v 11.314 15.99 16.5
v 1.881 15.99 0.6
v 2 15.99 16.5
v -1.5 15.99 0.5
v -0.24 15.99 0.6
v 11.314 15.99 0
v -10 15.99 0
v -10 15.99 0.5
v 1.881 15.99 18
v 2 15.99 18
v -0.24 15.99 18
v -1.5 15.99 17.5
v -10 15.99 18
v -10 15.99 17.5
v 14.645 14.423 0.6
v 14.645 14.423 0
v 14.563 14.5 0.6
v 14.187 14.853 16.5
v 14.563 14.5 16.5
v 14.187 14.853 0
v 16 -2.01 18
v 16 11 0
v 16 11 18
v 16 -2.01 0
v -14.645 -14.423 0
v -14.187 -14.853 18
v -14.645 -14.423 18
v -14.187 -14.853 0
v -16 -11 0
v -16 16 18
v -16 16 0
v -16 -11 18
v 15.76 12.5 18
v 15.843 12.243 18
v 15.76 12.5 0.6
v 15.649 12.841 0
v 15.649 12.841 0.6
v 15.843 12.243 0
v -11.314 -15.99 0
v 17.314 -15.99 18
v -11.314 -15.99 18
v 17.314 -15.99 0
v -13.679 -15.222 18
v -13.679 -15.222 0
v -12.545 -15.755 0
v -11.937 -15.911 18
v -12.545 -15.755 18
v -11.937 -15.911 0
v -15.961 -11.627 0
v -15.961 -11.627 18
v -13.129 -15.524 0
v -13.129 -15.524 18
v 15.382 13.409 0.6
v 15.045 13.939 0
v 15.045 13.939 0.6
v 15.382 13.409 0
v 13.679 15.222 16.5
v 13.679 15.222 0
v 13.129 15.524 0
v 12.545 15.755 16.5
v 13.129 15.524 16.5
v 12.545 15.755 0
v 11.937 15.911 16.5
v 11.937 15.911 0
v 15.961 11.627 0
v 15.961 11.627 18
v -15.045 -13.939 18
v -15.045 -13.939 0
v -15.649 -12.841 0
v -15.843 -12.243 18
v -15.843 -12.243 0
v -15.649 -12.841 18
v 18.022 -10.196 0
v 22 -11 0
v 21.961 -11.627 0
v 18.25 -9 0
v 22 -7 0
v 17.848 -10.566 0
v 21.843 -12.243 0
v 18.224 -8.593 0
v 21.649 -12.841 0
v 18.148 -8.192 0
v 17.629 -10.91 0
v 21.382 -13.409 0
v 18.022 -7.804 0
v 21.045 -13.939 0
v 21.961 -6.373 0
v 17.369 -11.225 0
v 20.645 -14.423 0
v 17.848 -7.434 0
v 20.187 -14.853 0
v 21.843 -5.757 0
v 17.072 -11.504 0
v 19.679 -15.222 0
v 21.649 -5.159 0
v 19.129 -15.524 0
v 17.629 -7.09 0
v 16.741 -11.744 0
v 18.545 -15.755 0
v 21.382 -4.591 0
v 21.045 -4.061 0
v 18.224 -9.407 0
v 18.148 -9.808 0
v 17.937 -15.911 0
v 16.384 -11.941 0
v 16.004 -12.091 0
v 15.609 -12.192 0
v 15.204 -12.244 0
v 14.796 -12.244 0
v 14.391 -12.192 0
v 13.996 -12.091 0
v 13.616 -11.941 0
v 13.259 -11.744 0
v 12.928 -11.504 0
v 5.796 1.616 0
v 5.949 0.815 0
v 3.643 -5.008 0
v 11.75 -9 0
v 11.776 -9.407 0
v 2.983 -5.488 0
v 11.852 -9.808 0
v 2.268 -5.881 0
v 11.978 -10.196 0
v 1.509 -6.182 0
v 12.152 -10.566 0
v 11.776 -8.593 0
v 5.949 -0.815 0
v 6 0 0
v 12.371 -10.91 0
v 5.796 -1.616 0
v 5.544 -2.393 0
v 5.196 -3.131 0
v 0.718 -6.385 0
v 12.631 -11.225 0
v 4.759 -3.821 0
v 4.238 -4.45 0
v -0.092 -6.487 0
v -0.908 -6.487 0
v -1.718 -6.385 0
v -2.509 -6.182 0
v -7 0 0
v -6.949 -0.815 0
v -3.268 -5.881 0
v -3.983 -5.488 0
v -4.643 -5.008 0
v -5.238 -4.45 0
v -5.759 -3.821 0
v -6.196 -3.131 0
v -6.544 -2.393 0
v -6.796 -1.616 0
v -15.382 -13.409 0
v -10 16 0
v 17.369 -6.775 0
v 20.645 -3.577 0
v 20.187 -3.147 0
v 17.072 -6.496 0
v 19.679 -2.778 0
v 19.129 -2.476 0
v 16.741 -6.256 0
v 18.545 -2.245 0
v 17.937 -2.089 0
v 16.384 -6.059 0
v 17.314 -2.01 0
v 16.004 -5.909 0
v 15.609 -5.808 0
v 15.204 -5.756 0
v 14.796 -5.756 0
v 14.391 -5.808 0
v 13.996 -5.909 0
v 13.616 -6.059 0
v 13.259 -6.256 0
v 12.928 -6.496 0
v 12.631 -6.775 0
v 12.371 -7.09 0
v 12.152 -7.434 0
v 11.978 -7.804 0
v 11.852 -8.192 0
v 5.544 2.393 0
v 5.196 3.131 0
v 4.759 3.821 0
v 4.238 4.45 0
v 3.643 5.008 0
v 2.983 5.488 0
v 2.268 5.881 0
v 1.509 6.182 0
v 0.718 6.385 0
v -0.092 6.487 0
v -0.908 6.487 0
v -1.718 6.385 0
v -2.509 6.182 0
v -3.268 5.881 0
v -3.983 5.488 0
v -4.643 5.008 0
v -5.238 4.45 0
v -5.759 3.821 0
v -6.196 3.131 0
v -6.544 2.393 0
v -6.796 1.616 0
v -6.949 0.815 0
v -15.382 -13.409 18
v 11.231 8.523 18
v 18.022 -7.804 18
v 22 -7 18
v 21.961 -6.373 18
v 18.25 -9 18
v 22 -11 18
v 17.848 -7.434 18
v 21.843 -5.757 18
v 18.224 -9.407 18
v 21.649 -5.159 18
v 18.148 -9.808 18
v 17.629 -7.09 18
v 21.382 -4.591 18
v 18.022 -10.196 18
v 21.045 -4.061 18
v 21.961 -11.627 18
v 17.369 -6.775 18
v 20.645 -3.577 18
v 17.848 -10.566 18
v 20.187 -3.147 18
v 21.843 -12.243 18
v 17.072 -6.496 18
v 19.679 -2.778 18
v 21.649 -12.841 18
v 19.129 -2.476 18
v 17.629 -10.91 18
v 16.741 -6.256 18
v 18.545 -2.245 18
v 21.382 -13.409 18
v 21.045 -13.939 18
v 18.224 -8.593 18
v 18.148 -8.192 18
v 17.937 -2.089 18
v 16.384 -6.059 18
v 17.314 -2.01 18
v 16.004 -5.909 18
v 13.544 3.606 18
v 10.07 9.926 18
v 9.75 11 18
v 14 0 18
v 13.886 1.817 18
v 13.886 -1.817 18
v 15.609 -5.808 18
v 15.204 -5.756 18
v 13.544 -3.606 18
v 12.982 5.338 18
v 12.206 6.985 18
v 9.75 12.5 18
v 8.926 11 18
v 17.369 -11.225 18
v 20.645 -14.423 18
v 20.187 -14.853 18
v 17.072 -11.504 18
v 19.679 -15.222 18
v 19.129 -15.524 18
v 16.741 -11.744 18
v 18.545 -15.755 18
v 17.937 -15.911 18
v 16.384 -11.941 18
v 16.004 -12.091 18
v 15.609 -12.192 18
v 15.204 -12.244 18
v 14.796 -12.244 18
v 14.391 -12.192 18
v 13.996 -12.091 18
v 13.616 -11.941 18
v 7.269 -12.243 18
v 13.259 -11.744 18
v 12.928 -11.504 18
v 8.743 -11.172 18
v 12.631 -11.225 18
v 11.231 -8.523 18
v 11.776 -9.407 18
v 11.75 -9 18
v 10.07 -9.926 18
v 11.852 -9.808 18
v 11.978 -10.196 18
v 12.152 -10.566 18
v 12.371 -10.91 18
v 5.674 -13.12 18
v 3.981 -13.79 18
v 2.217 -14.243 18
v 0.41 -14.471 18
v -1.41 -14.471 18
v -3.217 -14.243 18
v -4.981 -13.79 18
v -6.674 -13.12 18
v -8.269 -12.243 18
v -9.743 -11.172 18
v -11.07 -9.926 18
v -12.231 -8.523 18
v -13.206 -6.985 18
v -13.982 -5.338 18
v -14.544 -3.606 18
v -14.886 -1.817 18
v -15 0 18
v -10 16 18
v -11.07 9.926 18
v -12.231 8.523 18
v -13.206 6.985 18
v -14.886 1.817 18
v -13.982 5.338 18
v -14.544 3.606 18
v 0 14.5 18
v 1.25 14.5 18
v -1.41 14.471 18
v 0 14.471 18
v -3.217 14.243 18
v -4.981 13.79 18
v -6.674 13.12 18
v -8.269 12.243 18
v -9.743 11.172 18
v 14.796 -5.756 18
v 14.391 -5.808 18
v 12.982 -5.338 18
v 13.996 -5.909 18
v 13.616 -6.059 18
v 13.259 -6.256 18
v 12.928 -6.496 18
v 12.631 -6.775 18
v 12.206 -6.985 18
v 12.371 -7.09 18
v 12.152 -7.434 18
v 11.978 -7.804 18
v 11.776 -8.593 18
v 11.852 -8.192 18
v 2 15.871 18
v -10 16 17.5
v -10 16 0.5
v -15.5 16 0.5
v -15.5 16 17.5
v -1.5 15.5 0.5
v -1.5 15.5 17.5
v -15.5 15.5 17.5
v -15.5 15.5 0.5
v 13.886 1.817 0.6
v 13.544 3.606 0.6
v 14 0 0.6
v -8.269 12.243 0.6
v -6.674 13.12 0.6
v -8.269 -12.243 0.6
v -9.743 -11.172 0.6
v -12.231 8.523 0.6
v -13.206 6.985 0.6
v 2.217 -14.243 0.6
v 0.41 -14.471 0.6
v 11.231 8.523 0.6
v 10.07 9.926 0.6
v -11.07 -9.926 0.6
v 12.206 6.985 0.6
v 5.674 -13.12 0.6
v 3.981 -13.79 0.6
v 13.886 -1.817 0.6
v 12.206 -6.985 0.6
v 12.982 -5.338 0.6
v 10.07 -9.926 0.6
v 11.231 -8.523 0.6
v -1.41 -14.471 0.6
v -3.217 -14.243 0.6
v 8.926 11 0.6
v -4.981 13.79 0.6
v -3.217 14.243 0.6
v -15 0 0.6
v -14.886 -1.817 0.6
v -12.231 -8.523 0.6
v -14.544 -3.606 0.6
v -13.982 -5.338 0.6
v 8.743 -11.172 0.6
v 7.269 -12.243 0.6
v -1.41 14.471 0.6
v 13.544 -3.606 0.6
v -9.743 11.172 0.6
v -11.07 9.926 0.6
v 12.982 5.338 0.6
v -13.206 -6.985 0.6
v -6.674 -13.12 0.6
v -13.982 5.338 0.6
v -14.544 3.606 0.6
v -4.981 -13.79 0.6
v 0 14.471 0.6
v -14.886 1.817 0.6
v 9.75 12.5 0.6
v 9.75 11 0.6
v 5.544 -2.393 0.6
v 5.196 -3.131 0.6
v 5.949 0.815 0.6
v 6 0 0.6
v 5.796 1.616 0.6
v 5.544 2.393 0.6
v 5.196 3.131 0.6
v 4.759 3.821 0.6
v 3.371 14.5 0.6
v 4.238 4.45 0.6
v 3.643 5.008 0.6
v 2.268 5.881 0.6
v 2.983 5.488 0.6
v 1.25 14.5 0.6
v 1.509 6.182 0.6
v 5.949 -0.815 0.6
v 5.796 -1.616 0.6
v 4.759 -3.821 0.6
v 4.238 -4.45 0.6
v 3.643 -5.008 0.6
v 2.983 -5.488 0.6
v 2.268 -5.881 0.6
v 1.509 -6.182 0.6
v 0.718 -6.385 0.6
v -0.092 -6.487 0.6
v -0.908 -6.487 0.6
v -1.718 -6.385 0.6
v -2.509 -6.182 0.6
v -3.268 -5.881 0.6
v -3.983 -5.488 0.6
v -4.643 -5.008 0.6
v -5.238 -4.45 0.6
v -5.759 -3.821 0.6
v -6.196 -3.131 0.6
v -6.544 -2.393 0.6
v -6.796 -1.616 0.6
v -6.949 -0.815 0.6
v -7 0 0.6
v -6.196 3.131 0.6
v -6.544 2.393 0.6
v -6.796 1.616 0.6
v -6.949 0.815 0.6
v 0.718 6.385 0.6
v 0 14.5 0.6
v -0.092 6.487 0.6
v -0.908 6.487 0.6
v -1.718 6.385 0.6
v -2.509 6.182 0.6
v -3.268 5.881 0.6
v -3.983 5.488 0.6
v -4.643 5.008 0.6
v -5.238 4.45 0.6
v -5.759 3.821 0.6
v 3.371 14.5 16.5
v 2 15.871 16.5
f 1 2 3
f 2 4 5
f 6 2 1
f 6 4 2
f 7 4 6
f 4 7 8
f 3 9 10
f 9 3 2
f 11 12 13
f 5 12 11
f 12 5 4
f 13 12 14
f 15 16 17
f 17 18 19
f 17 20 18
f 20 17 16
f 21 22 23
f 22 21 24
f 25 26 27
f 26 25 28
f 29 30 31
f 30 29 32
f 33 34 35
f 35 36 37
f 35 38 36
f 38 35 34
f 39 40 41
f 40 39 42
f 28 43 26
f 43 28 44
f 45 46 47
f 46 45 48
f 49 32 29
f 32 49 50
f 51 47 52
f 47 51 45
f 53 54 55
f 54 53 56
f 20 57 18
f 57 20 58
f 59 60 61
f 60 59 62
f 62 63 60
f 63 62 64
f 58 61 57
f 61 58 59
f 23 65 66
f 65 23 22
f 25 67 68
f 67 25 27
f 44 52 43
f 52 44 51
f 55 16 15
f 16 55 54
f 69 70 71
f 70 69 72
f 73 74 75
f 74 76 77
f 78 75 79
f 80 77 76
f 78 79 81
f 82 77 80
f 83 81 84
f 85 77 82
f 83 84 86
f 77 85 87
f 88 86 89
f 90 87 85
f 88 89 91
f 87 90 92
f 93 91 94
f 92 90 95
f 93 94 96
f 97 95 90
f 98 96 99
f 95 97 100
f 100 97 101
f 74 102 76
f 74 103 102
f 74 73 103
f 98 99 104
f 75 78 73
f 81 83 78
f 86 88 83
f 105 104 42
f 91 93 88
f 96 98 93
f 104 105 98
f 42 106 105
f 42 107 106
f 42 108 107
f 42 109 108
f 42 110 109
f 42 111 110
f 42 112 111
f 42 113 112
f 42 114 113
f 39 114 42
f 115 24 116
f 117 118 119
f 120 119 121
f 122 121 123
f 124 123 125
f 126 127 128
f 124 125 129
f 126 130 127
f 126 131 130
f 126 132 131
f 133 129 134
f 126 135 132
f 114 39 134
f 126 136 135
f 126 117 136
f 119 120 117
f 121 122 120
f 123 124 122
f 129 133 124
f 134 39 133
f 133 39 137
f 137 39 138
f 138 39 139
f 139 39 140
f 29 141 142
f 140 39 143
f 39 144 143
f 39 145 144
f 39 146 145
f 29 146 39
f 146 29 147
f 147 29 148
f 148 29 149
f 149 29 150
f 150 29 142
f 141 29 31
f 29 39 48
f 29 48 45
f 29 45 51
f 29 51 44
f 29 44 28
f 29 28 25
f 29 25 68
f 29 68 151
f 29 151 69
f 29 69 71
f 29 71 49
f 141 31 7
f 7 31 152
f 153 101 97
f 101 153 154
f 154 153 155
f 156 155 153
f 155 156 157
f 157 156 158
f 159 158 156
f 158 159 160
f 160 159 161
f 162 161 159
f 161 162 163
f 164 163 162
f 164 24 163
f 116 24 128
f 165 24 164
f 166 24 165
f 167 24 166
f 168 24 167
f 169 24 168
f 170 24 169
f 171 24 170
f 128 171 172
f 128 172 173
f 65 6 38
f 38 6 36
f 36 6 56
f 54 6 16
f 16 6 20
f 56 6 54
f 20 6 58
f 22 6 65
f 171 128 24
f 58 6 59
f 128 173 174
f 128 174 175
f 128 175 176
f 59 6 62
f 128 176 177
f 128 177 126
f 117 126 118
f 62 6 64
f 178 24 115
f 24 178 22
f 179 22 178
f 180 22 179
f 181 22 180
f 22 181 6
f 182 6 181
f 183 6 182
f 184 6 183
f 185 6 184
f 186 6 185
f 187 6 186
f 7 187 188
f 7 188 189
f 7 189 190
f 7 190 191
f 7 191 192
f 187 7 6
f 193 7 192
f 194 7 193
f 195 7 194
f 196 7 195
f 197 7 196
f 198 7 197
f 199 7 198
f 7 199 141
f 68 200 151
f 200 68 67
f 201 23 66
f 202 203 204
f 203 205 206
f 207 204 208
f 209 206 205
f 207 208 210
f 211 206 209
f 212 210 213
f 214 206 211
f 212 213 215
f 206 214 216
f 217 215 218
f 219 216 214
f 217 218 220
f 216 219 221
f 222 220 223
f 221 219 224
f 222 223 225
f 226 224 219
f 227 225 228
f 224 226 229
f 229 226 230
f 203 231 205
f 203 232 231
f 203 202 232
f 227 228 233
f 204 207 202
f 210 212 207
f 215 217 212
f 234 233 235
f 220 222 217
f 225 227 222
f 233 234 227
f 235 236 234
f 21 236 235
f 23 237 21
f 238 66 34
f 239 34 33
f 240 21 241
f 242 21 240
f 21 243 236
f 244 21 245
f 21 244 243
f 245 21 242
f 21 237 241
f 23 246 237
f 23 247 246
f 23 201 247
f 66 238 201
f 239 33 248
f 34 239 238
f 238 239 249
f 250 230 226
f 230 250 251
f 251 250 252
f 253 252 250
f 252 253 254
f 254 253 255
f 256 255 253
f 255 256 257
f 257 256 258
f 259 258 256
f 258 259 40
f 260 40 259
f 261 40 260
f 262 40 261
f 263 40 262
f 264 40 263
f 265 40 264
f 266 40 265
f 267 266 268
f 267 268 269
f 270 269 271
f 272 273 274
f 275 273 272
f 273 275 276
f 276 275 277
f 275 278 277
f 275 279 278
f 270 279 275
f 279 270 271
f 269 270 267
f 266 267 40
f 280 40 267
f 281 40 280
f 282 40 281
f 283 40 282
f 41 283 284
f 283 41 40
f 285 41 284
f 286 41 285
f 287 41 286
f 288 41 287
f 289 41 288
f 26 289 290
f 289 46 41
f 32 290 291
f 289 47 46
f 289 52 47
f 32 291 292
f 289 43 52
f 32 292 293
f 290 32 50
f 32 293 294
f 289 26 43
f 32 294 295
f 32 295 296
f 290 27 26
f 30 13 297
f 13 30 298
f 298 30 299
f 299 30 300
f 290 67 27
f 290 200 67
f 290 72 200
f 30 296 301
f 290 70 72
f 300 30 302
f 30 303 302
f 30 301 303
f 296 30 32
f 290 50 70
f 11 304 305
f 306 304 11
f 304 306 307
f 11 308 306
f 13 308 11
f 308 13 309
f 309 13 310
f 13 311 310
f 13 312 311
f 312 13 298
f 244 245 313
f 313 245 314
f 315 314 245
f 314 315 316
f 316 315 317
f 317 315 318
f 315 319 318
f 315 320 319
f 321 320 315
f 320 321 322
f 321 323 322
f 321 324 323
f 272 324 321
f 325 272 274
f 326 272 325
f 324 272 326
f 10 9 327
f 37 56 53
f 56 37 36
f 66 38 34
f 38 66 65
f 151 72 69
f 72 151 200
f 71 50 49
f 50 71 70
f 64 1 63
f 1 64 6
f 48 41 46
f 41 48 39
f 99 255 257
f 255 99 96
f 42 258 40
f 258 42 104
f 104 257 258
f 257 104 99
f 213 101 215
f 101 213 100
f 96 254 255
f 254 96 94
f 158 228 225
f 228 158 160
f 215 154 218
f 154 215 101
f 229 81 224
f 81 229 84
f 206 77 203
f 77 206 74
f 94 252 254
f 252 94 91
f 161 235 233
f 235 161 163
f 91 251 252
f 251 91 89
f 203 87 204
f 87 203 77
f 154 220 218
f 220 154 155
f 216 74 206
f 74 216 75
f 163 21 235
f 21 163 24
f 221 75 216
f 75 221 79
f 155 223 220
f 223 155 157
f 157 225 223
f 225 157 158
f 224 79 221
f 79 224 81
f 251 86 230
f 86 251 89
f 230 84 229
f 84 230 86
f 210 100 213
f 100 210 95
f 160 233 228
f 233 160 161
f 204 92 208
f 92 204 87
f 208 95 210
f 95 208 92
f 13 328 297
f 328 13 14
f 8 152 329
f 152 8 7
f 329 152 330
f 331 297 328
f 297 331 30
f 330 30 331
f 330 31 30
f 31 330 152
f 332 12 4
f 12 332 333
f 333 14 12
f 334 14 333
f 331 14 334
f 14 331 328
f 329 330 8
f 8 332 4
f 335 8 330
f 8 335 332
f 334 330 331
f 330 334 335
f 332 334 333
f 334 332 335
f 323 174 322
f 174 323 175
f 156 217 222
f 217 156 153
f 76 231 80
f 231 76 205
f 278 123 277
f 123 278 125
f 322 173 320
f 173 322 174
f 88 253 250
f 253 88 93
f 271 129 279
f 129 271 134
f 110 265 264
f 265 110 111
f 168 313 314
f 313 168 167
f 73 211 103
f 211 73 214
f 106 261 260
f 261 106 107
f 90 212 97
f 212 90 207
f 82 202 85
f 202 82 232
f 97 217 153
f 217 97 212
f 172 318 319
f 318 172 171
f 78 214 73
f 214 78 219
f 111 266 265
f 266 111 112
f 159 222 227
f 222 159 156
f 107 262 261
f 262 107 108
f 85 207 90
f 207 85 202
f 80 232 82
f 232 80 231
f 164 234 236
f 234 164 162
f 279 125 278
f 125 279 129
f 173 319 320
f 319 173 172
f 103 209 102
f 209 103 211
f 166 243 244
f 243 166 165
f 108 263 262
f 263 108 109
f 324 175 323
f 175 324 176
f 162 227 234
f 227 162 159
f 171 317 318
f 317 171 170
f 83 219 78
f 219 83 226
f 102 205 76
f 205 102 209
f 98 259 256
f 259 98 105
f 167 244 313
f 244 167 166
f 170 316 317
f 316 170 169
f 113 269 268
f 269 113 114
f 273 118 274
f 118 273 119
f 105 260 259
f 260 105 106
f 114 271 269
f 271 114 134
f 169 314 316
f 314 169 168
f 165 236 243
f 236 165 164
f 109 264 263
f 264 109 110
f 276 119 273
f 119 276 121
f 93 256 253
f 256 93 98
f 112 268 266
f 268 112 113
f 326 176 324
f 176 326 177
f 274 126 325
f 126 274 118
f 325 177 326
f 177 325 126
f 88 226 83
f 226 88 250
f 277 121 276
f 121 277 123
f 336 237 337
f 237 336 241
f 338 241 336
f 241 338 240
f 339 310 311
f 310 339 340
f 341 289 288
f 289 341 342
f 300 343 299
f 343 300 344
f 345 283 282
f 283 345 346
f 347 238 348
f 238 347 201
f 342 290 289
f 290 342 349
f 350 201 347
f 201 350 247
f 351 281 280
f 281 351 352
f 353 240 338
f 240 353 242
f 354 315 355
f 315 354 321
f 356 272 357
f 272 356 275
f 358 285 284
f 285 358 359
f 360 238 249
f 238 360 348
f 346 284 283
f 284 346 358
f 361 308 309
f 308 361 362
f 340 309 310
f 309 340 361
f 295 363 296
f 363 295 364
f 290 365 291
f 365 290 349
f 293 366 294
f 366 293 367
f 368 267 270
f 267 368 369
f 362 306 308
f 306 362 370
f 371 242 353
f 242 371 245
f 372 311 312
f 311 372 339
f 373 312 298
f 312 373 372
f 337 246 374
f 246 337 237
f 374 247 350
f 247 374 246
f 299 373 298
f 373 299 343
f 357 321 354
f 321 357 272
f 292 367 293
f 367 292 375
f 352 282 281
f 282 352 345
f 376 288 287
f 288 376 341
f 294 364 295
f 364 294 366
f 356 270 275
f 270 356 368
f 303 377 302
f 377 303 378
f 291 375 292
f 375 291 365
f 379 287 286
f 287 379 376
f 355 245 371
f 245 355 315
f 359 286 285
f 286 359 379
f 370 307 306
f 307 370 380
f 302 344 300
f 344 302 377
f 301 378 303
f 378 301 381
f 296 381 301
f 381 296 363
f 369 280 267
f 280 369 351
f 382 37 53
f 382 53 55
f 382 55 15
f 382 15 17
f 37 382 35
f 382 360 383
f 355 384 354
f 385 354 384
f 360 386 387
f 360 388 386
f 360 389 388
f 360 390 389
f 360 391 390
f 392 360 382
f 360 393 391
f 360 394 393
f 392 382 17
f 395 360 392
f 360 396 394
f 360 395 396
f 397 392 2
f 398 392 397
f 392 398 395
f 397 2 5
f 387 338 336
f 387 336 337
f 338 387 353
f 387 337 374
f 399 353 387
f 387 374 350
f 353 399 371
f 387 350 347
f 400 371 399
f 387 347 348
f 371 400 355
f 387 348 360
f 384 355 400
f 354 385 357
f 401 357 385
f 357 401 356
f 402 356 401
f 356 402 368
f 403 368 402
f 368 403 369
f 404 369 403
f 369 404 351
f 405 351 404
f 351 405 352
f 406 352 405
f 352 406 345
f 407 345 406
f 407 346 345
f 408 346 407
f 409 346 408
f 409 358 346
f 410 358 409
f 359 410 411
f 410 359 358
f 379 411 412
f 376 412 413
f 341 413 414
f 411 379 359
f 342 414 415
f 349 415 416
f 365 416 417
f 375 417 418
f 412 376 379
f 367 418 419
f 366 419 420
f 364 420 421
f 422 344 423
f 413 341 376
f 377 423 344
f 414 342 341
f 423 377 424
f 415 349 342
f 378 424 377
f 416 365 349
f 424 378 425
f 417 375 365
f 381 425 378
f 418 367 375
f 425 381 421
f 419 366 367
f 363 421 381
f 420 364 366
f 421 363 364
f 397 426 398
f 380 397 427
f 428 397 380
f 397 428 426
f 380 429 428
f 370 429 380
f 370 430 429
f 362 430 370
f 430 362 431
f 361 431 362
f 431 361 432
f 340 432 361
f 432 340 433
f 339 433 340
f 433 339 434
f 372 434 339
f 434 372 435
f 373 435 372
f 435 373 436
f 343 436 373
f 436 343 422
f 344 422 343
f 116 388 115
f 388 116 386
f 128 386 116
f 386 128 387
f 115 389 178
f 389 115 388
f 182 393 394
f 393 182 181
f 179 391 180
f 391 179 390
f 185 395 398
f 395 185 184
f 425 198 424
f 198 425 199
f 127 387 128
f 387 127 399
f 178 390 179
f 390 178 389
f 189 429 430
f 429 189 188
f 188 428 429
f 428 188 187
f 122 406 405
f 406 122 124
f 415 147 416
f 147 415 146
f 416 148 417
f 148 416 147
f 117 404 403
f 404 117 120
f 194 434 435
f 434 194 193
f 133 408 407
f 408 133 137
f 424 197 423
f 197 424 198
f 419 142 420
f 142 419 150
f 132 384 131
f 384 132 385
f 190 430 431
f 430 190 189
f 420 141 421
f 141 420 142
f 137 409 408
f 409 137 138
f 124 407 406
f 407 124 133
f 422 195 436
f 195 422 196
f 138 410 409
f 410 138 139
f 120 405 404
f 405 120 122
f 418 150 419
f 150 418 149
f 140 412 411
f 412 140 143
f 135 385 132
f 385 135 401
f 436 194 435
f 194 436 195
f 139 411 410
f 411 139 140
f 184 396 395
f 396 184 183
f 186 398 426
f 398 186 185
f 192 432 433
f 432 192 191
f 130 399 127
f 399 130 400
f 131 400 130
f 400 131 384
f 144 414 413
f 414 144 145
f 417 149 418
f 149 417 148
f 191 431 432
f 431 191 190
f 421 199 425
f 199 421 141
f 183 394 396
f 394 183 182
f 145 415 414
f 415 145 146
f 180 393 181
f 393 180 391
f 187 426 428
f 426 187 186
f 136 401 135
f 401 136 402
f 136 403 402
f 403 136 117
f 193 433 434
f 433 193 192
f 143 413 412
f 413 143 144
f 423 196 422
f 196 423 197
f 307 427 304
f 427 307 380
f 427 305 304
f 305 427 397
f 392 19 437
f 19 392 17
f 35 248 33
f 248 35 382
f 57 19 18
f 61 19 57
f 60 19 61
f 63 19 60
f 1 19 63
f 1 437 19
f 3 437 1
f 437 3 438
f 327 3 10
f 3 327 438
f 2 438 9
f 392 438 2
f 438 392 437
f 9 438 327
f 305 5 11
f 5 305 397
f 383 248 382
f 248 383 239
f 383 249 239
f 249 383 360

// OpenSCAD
$fn = 50;


difference() {
	union() {
		hull() {
			translate(v = [-11.0000000000, 11.0000000000, 0]) {
				cylinder(h = 18, r = 5);
			}
			translate(v = [11.0000000000, 11.0000000000, 0]) {
				cylinder(h = 18, r = 5);
			}
			translate(v = [-11.0000000000, -11.0000000000, 0]) {
				cylinder(h = 18, r = 5);
			}
			translate(v = [11.0000000000, -11.0000000000, 0]) {
				cylinder(h = 18, r = 5);
			}
		}
		translate(v = [7.5000000000, -9.0000000000, 0]) {
			hull() {
				translate(v = [-9.5000000000, 2.0000000000, 0]) {
					cylinder(h = 18, r = 5);
				}
				translate(v = [9.5000000000, 2.0000000000, 0]) {
					cylinder(h = 18, r = 5);
				}
				translate(v = [-9.5000000000, -2.0000000000, 0]) {
					cylinder(h = 18, r = 5);
				}
				translate(v = [9.5000000000, -2.0000000000, 0]) {
					cylinder(h = 18, r = 5);
				}
			}
		}
		translate(v = [-16.0000000000, 10.0000000000, 0]) {
			cube(size = [6, 6, 18]);
		}
	}
	union() {
		translate(v = [-15.5000000000, 15.5000000000, 0.5000000000]) {
			cube(size = [14, 0.5000000000, 17.0000000000]);
		}
		translate(v = [15.0000000000, -9.0000000000, -50.0000000000]) {
			cylinder(h = 100, r = 3.2500000000);
		}
		translate(v = [-0.5000000000, 0.0000000000, 0.6000000000]) {
			cylinder(h = 20.4000000000, r = 14.5000000000);
		}
		translate(v = [-0.5000000000, 0.0000000000, -9.0000000000]) {
			cylinder(h = 18, r = 6.5000000000);
		}
		translate(v = [0.0000000000, 12.5000000000, 0.6000000000]) {
			cube(size = [16.0000000000, 2, 20.4000000000]);
		}
		translate(v = [2.0000000000, 12.5000000000, 16.5000000000]) {
			cube(size = [14.0000000000, 5, 1.5000000000]);
		}
		translate(v = [-3.0000000000, 18.7500000000, 0.6000000000]) {
			rotate(a = [0, 0, -45]) {
				cube(size = [10, 1.5000000000, 20.4000000000]);
			}
		}
		translate(v = [2.2500000000, 11.0000000000, 0.6000000000]) {
			cube(size = [7.5000000000, 2, 17.4000000000]);
		}
	}
}
